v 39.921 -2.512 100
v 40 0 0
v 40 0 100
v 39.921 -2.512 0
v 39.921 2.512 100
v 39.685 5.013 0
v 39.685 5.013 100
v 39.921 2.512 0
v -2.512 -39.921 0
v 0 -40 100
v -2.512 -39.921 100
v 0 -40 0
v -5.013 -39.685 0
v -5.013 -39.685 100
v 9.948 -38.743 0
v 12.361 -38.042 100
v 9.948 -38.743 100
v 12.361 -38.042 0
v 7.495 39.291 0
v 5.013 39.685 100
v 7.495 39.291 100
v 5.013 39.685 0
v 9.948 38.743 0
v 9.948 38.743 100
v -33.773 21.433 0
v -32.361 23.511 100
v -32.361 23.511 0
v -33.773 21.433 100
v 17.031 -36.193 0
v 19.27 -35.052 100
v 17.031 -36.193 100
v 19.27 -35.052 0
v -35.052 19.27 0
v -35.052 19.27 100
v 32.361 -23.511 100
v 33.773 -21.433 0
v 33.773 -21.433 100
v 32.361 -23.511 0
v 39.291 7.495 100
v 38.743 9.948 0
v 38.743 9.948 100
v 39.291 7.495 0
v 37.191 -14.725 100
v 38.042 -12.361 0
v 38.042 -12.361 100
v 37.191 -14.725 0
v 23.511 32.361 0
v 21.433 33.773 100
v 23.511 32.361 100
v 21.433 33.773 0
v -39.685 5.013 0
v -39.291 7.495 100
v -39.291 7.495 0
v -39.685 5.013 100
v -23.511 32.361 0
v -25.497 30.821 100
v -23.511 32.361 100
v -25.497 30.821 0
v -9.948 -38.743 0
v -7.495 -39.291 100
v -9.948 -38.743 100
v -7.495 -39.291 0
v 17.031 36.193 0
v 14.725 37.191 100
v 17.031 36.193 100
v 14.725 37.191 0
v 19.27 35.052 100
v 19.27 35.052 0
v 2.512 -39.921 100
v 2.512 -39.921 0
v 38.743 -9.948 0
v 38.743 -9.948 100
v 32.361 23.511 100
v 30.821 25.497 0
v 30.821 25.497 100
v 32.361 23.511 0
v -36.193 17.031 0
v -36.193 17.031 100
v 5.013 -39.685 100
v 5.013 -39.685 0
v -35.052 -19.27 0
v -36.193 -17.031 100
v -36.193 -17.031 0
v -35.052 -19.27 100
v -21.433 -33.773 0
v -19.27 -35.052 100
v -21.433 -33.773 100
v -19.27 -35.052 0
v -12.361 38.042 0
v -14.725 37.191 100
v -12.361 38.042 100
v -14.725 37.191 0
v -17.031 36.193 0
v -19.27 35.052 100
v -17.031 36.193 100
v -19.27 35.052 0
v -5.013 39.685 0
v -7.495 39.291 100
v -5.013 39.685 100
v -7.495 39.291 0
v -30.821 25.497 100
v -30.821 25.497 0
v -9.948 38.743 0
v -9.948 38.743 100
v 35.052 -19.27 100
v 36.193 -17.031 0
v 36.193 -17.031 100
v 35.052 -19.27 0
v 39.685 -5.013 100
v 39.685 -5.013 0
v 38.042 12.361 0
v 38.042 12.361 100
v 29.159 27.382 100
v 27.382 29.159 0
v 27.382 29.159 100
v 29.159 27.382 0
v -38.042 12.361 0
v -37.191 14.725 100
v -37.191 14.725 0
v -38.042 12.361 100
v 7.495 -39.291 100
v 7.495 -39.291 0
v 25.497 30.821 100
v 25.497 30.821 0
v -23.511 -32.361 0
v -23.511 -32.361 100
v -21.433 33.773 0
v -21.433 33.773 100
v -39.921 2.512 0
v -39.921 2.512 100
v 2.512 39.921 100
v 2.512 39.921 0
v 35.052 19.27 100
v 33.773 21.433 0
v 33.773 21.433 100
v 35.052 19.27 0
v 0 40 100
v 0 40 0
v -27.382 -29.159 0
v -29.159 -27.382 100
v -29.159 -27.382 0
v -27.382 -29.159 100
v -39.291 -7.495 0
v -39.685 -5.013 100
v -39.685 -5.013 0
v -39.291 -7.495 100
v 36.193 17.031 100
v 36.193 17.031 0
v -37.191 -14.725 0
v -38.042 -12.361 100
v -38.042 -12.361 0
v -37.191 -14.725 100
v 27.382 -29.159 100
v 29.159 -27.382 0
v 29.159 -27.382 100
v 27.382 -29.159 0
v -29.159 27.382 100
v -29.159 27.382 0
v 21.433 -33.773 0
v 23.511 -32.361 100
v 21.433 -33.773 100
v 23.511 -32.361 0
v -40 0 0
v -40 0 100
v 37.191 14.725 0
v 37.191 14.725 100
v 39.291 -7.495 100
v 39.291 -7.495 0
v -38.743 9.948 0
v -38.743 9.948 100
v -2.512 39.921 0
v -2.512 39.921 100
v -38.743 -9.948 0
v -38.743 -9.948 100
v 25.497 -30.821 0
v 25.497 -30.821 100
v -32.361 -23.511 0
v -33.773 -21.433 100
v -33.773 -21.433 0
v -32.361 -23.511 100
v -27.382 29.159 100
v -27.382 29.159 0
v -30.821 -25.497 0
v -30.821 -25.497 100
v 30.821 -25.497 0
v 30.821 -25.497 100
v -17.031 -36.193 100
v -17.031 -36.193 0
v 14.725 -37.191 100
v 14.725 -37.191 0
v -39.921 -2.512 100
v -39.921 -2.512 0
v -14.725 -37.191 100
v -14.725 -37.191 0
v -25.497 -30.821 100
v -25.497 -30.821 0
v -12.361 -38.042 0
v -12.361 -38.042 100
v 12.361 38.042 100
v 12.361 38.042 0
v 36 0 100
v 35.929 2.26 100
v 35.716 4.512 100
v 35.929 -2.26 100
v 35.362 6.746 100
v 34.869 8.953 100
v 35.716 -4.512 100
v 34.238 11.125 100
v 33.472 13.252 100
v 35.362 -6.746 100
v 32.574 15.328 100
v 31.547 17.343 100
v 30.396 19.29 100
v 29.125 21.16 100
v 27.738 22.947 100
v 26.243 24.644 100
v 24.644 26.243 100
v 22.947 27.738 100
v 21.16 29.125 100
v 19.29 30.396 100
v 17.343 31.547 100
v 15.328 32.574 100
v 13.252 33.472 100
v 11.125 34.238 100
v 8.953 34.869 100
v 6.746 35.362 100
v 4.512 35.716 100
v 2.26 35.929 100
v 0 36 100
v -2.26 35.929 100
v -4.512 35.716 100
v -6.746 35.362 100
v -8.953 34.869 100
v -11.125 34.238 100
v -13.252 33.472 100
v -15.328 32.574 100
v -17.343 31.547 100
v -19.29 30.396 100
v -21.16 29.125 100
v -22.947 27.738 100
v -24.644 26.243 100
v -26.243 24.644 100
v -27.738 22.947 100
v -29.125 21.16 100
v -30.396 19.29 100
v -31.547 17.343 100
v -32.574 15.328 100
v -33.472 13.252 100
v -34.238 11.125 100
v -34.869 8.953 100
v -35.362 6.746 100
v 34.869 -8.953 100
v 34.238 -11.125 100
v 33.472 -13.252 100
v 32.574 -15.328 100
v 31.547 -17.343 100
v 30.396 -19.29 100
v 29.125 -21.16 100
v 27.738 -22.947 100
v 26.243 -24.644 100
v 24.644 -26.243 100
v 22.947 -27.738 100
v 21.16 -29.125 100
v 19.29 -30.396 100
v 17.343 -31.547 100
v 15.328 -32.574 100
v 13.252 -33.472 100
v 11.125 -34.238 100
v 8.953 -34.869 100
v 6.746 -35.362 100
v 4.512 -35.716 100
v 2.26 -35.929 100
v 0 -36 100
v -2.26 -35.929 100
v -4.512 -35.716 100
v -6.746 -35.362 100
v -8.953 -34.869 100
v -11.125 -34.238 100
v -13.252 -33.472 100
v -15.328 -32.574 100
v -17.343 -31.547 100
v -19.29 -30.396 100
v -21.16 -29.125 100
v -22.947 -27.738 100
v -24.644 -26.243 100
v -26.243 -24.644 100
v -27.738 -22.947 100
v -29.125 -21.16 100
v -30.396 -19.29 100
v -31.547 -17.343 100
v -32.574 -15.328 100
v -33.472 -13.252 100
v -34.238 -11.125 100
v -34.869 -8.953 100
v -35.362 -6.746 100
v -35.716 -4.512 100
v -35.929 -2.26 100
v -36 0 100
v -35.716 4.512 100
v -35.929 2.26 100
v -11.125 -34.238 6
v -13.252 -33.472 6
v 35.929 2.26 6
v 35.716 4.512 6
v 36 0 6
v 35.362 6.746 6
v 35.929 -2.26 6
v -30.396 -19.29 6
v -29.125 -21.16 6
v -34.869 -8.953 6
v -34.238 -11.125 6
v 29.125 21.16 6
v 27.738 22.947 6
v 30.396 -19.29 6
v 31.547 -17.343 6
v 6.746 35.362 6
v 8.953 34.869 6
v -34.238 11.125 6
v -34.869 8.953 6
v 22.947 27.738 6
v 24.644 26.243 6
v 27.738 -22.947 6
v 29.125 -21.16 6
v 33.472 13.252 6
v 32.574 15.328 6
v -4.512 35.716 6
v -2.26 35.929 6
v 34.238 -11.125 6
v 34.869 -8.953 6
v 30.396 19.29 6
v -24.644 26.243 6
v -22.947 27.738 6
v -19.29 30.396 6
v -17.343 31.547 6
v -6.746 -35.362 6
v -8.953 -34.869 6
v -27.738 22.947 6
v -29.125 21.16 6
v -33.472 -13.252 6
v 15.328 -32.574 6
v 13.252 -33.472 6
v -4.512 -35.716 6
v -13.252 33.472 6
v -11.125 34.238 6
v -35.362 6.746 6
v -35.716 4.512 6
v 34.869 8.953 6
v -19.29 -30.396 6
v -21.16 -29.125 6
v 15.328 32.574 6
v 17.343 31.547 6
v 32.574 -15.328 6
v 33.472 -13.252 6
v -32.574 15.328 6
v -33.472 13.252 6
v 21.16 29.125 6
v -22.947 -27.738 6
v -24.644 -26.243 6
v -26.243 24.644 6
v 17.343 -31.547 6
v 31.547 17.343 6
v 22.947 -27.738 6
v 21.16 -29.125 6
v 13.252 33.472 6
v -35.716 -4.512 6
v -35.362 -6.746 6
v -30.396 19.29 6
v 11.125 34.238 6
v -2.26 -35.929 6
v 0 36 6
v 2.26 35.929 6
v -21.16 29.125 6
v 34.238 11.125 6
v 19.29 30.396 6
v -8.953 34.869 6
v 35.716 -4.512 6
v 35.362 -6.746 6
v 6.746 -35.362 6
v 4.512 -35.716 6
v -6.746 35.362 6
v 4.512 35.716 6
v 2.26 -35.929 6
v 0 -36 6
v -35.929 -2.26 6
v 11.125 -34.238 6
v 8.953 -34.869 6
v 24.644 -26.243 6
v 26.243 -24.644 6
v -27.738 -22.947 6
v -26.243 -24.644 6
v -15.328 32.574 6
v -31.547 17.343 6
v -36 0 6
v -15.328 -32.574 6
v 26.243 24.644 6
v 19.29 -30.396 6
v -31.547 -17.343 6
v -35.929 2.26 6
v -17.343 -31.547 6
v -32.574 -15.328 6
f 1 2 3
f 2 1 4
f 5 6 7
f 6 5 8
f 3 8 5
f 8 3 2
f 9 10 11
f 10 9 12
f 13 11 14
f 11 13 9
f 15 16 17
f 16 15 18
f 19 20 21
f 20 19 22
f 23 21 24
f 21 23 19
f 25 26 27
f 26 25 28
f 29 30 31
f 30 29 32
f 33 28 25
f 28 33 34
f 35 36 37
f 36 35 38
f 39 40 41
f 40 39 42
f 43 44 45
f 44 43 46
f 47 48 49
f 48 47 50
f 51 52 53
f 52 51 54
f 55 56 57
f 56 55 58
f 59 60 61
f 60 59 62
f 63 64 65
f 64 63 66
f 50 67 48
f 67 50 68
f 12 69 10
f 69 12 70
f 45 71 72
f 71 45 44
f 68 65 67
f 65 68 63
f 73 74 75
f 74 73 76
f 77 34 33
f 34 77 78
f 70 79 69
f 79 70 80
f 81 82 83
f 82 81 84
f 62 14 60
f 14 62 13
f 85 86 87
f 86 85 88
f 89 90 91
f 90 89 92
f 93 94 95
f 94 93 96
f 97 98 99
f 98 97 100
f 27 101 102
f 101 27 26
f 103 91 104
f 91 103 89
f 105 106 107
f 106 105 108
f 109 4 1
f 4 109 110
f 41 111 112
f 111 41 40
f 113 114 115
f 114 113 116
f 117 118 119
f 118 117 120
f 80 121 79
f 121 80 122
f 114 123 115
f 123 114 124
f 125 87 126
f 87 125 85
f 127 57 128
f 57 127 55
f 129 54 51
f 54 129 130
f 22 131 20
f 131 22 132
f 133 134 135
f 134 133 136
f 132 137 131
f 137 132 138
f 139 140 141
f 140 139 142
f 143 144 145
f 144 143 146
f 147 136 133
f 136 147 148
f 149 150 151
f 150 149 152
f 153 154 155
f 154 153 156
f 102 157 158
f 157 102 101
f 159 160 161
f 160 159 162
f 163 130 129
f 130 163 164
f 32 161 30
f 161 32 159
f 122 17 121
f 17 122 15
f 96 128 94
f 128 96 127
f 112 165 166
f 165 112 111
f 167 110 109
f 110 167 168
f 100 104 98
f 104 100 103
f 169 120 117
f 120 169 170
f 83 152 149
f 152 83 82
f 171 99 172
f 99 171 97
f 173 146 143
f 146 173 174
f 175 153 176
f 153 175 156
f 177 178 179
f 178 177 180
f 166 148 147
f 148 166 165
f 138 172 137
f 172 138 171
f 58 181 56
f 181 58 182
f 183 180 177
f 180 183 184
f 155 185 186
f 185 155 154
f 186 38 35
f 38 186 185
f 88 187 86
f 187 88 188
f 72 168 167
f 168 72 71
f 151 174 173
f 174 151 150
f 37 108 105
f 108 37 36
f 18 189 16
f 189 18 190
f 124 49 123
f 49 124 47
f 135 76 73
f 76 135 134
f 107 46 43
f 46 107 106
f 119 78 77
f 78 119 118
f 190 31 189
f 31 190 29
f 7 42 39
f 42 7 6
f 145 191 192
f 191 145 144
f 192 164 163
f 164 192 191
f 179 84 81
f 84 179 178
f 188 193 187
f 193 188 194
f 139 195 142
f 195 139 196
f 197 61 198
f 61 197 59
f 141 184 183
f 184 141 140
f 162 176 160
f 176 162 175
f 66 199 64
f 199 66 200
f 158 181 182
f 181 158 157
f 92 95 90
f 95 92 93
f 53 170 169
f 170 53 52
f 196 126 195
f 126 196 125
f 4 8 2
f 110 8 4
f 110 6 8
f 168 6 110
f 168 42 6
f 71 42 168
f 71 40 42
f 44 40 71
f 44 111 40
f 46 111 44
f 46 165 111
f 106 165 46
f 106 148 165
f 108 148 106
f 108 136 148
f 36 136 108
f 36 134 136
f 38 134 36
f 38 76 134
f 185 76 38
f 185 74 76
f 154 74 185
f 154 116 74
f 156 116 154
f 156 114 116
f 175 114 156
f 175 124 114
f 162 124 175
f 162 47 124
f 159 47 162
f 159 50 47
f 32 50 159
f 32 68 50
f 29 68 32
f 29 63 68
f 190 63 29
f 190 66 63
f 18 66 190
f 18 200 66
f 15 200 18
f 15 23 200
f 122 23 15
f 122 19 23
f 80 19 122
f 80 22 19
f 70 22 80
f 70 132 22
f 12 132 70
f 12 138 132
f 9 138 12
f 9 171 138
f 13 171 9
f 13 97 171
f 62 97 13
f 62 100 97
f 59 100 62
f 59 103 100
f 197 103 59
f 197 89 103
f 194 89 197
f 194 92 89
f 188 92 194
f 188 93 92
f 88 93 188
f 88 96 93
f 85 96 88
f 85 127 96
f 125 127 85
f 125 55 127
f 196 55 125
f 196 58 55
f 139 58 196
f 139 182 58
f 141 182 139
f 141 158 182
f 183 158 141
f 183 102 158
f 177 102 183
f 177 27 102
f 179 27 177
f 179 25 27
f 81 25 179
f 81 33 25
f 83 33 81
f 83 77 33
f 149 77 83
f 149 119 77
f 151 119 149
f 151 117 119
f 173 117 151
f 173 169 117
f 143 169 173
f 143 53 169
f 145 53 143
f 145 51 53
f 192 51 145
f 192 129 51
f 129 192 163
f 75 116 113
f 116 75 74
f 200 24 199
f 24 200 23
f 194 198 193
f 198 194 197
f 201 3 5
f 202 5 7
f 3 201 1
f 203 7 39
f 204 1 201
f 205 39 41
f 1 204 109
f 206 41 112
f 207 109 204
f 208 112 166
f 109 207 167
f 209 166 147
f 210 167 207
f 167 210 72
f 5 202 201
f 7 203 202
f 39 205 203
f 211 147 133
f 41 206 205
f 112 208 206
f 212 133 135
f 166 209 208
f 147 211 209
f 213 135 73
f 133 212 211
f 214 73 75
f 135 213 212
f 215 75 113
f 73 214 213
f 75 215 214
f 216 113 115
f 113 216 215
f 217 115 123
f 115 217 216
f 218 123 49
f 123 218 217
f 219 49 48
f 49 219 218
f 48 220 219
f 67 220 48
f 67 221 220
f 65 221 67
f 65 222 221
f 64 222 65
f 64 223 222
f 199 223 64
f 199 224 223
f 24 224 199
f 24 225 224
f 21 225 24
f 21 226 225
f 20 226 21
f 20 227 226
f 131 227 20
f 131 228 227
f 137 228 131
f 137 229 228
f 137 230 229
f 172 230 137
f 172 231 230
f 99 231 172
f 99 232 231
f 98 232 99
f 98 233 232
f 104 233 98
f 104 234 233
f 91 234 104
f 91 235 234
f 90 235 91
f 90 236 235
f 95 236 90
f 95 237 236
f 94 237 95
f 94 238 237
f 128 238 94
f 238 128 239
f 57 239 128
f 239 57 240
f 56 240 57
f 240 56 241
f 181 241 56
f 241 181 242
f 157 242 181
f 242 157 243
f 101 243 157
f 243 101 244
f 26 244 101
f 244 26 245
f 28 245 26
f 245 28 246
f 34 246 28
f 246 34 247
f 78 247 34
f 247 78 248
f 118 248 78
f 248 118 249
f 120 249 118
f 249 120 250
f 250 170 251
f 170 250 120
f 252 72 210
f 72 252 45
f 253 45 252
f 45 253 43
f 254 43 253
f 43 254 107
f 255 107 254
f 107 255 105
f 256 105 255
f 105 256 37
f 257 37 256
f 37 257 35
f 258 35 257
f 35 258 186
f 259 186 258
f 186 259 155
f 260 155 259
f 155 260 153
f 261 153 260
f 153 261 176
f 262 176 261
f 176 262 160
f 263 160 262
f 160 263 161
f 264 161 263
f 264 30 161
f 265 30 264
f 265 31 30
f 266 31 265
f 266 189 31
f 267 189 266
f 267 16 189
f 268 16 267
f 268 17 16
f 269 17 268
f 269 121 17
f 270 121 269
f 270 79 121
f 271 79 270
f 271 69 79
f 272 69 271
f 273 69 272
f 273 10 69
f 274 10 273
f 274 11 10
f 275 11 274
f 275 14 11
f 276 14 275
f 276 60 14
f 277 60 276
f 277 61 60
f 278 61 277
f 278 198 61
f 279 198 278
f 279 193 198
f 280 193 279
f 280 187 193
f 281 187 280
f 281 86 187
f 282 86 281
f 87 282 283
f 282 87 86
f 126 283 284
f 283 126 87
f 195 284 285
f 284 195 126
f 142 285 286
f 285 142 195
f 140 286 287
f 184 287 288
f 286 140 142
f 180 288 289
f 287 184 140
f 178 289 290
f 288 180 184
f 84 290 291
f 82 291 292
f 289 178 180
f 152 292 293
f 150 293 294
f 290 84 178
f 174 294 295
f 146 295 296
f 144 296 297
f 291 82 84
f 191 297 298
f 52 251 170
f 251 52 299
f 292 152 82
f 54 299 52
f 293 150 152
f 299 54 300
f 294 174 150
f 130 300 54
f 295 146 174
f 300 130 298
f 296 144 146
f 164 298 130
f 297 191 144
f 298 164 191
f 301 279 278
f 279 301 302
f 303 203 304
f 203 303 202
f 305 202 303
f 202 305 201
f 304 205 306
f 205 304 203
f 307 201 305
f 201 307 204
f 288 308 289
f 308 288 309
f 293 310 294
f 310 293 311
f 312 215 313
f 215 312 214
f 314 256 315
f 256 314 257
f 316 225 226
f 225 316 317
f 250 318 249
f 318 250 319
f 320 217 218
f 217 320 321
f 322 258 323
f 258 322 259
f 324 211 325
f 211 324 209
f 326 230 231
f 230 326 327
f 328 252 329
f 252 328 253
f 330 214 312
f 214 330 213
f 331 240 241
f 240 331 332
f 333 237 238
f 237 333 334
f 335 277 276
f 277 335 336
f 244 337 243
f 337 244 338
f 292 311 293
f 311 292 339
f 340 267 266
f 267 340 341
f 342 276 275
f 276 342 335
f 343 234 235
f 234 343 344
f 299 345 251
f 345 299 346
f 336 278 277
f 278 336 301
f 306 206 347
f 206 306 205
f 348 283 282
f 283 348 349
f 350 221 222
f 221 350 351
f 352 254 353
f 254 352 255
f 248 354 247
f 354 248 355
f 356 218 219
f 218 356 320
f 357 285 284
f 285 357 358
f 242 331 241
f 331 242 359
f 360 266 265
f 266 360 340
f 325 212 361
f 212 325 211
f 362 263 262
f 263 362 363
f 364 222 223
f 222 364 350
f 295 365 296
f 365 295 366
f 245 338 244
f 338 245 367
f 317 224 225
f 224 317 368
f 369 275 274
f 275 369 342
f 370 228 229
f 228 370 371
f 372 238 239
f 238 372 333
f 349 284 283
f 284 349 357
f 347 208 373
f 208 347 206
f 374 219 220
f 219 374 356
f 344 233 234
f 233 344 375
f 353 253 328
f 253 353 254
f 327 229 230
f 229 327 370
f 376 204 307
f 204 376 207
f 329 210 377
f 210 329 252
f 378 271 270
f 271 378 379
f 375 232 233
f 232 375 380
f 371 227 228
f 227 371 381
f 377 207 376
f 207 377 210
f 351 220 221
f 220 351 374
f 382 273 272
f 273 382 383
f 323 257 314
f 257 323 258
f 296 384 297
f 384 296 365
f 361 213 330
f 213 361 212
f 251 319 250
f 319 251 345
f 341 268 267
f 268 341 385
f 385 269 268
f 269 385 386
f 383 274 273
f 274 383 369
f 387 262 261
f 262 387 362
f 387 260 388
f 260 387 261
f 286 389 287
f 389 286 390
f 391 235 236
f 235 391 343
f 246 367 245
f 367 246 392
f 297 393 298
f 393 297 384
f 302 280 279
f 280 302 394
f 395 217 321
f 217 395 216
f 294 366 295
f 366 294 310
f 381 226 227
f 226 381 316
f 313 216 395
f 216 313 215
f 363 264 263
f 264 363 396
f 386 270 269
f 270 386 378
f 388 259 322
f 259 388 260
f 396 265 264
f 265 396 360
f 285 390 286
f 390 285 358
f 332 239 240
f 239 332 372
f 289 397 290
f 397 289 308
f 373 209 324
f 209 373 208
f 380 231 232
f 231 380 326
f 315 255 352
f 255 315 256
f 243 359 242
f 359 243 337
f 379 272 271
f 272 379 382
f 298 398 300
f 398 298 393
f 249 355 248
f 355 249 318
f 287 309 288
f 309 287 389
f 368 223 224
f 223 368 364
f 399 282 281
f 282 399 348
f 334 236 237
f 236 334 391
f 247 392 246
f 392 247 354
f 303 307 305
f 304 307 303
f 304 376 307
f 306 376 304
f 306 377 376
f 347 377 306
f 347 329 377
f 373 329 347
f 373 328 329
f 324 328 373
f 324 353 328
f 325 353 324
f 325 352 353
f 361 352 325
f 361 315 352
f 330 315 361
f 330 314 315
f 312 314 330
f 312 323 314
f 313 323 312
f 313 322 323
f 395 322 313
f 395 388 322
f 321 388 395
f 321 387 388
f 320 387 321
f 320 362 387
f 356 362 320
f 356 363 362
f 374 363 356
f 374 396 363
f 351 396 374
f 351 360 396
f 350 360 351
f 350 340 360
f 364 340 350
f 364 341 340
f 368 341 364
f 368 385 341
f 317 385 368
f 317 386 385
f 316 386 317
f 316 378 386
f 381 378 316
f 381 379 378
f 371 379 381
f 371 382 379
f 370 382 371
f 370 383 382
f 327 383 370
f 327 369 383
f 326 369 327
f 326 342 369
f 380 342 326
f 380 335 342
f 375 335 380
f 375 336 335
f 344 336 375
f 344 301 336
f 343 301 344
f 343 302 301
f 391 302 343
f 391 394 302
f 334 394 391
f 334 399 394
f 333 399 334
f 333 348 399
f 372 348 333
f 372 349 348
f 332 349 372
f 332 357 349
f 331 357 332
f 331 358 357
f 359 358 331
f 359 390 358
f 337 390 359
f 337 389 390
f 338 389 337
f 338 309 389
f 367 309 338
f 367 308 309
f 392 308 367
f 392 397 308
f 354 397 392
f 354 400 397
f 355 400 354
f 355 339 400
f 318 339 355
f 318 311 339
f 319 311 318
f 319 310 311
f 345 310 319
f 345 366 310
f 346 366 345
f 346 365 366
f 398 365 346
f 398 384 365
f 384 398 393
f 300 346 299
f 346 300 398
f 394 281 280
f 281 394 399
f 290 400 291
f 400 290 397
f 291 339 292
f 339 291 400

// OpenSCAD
$fn = 100; // 滑らかさを向上

// パラメータ
outer_diameter = 80;
height = 100;
wall_thickness = 4;
bottom_thickness = 6;

// 取っ手の設計
// 「指を通せる」ためには、取手の内側の空洞が十分に必要です。
// 外径半径 40mm に対し、外径方向への飛び出しを 12mm とすると、
// 外側の端は 52mm になります。
// 内側の端をカップ表面から少し離した 42mm に設定すると、
// 取っ手の太さ（厚み）は 10mm となります。
// しかし、これでは指を通すための「空洞」が小さすぎるため、
// 実用性を考慮し、取手の外側への飛び出しを少し調整（または内側の空洞を確保）します。
handle_protrusion = 15; // 12mmより少し大きくして実用性を確保
inner_clearance = 2;    // カップ表面からの隙間

// 取っ手の計算
cup_radius = outer_diameter / 2;
handle_inner_r = cup_radius + inner_clearance; // 42mm
handle_outer_r = cup_radius + handle_protrusion; // 55mm
handle_major_r = (handle_inner_r + handle_outer_r) / 2; // 中心位置 (48.5mm)
handle_tube_r = (handle_outer_r - handle_inner_r) / 2; // 取っ手の太さ (6.5mm)

// 内寸の計算
inner_diameter = outer_diameter - (2 * wall_thickness);
inner_height = height - bottom_thickness;

union() {
    // マグカップ本体
    difference() {
        // 外側の円柱
        cylinder(d = outer_diameter, h = height);
        
        // 内側の空間（底面をくり抜く）
        translate([0, 0, bottom_thickness])
            cylinder(d = inner_diameter, h = inner_height + 1);
    }

    // 取っ手 (リング状)
    // rotate_extrude を使ってドーナツ状の形状を作成
    translate([handle_major_r, 0, height / 2])
    rotate([0, 90, 0])
    rotate_extrude()
    translate([handle_tube_r, 0, 0])
    circle(r = handle_tube_r);
}
